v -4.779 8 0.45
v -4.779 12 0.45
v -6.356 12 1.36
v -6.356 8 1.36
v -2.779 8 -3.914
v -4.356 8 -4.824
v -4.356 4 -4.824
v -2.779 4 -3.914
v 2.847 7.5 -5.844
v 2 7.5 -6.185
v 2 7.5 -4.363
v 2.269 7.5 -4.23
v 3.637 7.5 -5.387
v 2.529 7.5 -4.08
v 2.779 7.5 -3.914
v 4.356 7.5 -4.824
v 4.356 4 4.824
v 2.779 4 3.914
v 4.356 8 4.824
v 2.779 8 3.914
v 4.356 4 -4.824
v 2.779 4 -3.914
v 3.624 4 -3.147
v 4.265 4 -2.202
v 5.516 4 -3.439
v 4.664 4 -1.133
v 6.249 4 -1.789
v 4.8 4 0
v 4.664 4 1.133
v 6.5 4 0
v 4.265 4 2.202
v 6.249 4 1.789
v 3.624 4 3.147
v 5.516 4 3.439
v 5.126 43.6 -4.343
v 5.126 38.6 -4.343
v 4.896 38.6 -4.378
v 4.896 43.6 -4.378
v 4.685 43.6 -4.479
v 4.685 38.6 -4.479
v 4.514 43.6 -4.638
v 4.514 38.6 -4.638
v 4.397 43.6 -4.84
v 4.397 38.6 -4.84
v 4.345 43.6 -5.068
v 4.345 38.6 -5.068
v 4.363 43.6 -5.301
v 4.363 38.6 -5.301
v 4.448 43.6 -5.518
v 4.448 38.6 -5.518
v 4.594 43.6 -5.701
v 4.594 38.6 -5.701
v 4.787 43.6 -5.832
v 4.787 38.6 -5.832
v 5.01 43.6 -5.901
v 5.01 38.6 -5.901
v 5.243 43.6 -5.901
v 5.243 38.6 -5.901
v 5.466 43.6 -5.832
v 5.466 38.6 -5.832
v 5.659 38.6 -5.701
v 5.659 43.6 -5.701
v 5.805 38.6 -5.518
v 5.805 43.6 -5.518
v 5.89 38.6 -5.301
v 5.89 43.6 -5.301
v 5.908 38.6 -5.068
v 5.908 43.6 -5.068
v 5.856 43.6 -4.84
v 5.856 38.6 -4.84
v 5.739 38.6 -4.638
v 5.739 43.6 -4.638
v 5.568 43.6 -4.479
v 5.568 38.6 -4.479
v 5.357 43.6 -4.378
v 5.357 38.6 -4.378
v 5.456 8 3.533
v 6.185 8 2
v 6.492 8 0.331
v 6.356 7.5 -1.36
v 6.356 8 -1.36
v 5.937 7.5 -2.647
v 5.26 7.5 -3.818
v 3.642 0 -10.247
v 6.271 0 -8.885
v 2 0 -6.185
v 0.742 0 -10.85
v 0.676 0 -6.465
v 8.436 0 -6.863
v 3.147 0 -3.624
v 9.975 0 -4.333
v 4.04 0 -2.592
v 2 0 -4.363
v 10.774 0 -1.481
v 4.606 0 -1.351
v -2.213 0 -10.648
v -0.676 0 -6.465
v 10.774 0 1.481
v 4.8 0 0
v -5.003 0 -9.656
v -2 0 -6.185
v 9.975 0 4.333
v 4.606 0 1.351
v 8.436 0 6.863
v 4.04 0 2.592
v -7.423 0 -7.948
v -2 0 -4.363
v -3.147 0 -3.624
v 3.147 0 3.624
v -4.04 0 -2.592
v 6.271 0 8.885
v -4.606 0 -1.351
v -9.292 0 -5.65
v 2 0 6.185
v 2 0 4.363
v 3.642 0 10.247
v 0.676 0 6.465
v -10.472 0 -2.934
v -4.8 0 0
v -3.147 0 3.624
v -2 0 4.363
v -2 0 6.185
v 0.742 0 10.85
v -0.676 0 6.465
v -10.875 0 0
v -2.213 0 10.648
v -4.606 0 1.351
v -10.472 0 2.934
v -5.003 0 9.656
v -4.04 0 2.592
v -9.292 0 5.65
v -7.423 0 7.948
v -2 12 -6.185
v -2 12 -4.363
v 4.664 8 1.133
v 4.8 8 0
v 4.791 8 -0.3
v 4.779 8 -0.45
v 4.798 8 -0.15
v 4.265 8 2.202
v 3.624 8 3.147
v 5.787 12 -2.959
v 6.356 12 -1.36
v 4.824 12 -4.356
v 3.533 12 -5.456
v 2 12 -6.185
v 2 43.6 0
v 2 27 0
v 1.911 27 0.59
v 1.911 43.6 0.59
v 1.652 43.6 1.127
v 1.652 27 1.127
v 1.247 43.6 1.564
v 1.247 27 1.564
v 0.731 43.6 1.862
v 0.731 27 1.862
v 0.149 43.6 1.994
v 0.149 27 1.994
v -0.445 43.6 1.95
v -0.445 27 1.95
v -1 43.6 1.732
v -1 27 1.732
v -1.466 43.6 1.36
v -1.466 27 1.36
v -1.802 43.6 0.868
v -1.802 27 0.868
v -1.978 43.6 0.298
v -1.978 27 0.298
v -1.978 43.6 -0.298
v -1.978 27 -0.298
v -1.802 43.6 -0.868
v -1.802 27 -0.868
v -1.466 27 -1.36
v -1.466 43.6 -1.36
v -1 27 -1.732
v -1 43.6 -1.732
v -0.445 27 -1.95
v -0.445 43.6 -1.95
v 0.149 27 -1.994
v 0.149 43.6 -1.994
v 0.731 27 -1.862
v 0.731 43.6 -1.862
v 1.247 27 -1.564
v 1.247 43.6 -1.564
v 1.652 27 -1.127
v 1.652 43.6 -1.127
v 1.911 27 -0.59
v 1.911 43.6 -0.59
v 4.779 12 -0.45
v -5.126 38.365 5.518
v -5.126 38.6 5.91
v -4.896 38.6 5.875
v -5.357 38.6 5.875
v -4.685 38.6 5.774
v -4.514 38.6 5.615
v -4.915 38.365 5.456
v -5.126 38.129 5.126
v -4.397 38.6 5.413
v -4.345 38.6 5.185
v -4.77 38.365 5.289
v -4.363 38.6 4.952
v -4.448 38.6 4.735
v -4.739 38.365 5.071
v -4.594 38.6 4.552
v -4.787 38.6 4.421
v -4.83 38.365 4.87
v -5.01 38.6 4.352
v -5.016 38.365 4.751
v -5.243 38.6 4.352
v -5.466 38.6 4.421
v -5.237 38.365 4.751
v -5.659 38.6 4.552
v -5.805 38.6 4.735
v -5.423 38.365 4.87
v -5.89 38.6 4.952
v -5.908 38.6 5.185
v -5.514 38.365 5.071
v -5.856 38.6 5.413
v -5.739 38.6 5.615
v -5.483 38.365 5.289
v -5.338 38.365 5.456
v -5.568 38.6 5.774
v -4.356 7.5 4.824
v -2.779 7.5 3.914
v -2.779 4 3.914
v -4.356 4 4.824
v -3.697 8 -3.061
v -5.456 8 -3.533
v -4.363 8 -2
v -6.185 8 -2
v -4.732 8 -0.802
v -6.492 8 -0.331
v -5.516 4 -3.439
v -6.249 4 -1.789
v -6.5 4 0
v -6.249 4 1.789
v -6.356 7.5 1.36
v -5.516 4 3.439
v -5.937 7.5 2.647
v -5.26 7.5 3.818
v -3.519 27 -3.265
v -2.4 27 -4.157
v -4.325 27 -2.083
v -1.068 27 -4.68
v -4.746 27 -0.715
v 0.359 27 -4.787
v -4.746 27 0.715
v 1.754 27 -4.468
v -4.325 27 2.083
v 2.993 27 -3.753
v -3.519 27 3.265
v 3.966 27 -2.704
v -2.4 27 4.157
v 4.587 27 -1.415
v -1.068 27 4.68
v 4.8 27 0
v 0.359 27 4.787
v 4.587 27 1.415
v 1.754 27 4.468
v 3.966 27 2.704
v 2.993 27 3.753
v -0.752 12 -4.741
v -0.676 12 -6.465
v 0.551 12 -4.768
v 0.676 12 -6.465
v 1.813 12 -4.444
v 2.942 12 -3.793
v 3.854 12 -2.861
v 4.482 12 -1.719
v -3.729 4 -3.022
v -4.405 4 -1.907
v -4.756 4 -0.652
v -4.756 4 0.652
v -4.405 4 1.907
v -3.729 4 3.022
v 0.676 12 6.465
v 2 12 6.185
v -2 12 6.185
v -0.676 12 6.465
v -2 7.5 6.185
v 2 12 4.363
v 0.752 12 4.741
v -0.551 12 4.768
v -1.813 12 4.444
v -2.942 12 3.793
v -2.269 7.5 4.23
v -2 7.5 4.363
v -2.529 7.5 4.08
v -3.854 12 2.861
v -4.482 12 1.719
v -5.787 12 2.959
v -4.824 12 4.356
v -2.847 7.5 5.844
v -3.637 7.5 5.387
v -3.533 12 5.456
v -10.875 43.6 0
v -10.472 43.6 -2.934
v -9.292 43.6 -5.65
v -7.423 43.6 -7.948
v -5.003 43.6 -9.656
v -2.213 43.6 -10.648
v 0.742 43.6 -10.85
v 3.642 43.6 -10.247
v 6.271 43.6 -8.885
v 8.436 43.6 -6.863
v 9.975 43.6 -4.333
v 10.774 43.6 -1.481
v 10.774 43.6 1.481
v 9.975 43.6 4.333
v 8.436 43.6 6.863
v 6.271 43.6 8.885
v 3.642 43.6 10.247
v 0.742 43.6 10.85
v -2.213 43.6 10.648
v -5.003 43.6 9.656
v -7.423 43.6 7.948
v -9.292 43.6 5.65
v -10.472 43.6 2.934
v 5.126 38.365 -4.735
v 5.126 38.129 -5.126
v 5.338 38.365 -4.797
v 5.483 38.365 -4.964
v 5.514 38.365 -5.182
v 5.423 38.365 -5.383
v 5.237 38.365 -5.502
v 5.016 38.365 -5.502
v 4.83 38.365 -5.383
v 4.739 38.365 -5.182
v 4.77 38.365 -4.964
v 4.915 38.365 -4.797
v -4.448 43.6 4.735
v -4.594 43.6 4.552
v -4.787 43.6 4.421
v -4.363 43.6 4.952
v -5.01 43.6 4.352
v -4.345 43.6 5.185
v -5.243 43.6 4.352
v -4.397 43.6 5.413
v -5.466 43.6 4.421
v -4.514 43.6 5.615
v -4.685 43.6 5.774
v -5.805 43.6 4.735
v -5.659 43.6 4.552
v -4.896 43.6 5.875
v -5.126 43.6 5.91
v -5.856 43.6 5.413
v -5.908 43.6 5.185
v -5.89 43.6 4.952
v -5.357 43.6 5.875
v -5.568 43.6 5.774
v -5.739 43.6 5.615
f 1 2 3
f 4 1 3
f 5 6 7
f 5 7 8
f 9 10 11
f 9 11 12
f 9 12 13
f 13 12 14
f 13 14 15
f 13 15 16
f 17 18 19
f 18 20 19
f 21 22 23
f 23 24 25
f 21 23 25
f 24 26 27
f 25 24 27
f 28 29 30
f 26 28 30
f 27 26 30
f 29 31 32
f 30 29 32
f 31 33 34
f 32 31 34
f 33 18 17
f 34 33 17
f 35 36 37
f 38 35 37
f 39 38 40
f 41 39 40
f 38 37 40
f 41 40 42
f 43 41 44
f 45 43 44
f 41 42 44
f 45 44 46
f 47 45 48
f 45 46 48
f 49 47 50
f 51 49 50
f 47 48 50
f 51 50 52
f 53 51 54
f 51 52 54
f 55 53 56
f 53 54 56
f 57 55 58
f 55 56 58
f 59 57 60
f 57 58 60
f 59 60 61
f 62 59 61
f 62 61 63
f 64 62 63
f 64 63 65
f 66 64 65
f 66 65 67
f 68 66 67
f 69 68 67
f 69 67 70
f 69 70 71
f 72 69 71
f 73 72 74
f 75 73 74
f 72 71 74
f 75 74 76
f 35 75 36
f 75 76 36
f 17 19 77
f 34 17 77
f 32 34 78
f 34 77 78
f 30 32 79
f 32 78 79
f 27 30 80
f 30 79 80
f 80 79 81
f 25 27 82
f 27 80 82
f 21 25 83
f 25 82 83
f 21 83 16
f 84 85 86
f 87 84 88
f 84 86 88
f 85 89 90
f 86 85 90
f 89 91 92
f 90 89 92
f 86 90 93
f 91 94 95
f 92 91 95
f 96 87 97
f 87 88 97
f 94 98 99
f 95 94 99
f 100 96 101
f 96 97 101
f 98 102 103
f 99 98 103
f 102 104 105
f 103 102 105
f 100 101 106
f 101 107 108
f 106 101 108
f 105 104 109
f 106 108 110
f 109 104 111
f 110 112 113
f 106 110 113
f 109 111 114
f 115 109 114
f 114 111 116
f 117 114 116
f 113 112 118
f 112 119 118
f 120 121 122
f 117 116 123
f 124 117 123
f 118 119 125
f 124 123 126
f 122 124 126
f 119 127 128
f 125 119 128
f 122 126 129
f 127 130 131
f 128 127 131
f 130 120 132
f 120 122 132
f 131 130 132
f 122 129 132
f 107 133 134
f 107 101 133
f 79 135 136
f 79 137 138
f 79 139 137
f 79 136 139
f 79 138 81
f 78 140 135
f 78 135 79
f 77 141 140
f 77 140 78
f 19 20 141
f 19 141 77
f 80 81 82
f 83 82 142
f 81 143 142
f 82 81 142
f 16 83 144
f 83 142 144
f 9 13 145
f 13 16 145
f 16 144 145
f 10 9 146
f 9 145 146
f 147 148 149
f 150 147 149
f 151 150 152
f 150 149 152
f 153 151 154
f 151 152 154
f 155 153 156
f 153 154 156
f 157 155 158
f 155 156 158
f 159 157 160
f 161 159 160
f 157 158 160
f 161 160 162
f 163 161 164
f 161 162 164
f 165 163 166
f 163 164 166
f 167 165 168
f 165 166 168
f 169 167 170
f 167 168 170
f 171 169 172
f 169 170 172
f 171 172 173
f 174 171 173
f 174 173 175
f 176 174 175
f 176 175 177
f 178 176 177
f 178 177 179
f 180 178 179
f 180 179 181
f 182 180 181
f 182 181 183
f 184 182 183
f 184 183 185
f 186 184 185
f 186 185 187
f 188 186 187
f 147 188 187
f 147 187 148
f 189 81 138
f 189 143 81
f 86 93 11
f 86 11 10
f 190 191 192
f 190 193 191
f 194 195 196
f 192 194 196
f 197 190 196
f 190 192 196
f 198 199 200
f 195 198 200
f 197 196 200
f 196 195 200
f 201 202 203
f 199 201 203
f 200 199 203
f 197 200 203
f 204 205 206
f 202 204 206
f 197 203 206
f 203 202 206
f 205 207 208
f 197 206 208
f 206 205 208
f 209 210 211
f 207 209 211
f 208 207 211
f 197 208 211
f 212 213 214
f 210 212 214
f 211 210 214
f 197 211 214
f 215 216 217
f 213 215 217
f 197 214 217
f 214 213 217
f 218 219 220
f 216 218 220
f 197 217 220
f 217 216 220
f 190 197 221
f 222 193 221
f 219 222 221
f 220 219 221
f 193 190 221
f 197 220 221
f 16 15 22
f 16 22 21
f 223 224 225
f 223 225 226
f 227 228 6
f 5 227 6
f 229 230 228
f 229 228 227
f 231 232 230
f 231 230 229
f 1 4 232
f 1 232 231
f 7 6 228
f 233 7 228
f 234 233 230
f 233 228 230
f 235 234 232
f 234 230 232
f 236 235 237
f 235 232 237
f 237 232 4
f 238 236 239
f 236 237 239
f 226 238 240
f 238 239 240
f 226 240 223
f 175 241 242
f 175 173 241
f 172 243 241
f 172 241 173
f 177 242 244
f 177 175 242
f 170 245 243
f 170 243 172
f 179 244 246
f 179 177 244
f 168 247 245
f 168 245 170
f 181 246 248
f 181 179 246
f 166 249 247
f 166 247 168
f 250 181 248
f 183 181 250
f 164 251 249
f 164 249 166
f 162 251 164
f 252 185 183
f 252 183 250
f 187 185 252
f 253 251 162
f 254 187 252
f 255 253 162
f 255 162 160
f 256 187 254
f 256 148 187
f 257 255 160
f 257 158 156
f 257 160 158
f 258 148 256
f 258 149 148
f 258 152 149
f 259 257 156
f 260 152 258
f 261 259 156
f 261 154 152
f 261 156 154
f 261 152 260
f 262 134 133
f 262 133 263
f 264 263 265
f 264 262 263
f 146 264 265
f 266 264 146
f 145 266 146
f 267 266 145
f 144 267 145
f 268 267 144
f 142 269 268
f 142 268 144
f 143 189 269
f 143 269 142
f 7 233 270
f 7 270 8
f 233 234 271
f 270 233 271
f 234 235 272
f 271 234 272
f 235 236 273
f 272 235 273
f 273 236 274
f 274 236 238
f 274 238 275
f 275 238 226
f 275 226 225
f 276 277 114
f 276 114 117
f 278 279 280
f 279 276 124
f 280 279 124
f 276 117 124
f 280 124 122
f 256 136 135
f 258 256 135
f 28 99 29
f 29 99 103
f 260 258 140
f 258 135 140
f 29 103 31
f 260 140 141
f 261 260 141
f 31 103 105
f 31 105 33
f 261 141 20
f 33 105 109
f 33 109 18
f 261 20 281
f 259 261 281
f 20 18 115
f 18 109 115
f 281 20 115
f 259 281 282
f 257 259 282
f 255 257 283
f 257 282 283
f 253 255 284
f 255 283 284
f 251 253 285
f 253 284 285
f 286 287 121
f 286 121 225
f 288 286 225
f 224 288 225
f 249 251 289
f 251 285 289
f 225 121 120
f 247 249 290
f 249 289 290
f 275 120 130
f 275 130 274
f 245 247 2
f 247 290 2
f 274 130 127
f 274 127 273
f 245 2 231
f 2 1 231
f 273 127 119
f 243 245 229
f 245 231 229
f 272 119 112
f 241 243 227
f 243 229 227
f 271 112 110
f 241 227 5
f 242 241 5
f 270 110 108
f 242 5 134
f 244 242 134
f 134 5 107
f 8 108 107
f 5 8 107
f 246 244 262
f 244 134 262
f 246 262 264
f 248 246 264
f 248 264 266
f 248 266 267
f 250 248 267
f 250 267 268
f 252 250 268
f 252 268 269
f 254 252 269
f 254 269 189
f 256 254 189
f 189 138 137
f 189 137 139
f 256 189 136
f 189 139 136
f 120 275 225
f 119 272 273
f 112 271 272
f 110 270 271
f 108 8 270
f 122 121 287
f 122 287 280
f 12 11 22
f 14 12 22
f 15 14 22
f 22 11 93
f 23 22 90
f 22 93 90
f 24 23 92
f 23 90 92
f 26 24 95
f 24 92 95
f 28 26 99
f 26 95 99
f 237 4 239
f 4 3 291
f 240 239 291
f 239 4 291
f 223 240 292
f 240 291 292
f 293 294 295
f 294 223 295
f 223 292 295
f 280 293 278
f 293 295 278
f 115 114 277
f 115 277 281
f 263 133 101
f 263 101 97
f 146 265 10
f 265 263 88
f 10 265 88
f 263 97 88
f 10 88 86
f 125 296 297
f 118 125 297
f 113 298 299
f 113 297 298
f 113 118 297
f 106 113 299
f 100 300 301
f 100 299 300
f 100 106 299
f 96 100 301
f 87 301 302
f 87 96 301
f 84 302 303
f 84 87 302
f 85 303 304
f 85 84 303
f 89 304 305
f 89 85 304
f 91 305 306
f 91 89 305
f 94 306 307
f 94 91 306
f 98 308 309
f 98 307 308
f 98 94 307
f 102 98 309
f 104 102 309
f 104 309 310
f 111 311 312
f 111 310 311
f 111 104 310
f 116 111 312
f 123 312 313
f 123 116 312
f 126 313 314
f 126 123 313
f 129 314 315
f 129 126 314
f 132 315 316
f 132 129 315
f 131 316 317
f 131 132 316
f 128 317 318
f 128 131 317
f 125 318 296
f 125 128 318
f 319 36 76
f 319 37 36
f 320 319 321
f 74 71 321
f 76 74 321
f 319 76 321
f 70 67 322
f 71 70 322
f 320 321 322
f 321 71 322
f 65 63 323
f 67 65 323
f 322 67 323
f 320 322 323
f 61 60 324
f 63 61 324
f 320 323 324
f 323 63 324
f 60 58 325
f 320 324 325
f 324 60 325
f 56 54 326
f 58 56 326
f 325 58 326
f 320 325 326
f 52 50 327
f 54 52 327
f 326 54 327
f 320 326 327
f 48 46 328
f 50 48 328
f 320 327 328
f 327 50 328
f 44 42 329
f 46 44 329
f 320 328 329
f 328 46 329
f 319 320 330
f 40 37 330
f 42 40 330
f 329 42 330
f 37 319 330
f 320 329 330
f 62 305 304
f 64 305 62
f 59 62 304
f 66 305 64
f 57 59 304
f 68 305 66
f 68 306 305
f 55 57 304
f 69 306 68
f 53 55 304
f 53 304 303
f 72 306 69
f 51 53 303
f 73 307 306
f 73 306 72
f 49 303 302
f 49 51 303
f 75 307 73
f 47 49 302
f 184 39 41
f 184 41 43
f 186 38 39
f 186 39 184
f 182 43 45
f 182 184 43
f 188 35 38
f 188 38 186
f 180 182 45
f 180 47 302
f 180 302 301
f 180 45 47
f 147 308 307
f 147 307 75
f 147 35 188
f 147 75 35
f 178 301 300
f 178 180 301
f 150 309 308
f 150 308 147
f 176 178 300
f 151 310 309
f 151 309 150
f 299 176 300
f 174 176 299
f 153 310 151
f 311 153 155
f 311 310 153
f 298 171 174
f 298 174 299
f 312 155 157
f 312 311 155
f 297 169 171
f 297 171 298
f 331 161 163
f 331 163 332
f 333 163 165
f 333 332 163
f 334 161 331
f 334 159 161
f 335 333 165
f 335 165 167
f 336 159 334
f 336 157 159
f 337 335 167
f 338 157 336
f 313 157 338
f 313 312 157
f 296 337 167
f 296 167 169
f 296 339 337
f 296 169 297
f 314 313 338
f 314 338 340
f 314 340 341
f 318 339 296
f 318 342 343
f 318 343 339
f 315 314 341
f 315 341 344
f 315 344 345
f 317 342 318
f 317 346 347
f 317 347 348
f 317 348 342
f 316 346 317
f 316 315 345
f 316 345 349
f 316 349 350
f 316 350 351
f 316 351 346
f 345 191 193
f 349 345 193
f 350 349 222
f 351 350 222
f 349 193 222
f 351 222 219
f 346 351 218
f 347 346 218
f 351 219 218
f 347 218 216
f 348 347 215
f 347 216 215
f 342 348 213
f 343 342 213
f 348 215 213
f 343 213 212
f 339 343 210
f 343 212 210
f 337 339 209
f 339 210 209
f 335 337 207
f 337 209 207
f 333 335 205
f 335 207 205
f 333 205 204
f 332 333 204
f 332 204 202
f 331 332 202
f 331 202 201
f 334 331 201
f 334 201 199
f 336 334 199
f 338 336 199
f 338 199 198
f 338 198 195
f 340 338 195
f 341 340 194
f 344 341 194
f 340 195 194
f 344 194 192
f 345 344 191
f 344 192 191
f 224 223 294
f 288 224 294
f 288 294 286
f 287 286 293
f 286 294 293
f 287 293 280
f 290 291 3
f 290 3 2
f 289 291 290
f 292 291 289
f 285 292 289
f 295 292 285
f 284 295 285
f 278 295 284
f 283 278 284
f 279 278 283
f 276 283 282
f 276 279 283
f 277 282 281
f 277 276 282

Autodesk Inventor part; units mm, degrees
ref_plane "YZ Plane" through (0, 0, 0) normal (1, 0, 0) x (0, 1, 0)
ref_plane "XZ Plane" through (0, 0, 0) normal (0, 1, 0) x (-1, 0, 0)
sketch "Sketch1" plane through (0, 0, 0) normal (0, 1, 0) x (-1, 0, 0)
  circle A0 centre (0, 0) radius 10.875
  dimension "d0" = 21.75
extrude "Extrusion1" add sketch "Sketch1" along normal blind 43.6
sketch "Sketch2" plane through (0, 0, 0) normal (0, -1, 0) x (1, 0, 0)
  circle A0 centre (0, 0) radius 2
  dimension "d3" = 4
extrude "Extrusion2" cut sketch "Sketch2" against normal through all
sketch "Sketch3" plane through (0, 0, 0) normal (0, -1, 0) x (1, 0, 0)
  line L0 (-2, -6.1847) -> (-2, 6.1847)
  line L1 (2, 6.1847) -> (2, -6.1847)
  arc A0 (2, 6.1847) -> (-2, 6.1847) centre (0, 0) ccw
  arc A1 (-2, -6.1847) -> (2, -6.1847) centre (0, 0) ccw
  dimension "d26" = 6.5
  dimension "d27" = 4
  dimension "d28" = 2
extrude "Extrusion3" cut sketch "Sketch3" against normal blind 12
sketch "Sketch4" plane through (0, 12, 0) normal (0, -1, 0) x (1, 0, 0)
  line L0 (2, -7.1361) -> (-2, -7.1361) construction
  line L1 (-2, -7.1361) -> (-2, 7.9296) construction
  line L2 (-2, 7.9296) -> (2, 7.9296) construction
  line L3 (2, 7.9296) -> (2, -7.1361) construction
  line L4 (7.1801, -1.836) -> (5.1801, -5.3001) construction
  line L5 (5.1801, -5.3001) -> (-7.8673, 2.2328) construction
  line L6 (-7.8673, 2.2328) -> (-5.8673, 5.6969) construction
  line L7 (-5.8673, 5.6969) -> (7.1801, -1.836) construction
  arc A0 (-2, 6.1847) -> (-6.3561, 1.3603) centre (0, 0) ccw
  arc A1 (2, -6.1847) -> (6.3561, -1.3603) centre (0, 0) ccw
  line L8 (-2, 6.1847) -> (-2, 3.4641)
  line L9 (6.3561, -1.3603) -> (-2, 3.4641)
  line L10 (2, -6.1847) -> (2, -3.4641)
  line L11 (2, -3.4641) -> (-6.3561, 1.3603)
  dimension "d29" = 4
  dimension "d32" = 60
extrude "Extrusion4" cut sketch "Sketch4" along normal blind 4.5
ref_plane "Work Plane1" through (0, 8, 0) normal (0, -1, 0) x (1, 0, 0)
sketch "Sketch5" plane through (0, 8, 0) normal (0, -1, 0) x (1, 0, 0)
  line L0 (2, -9.381) -> (-2, -9.381) construction
  line L1 (-2, -9.381) -> (-2, 10.3615) construction
  line L2 (-2, 10.3615) -> (2, 10.3615) construction
  line L3 (2, 10.3615) -> (2, -9.381) construction
  line L4 (9.1242, -2.9584) -> (7.1242, -6.4225) construction
  line L5 (7.1242, -6.4225) -> (-9.9734, 3.4487) construction
  line L6 (-9.9734, 3.4487) -> (-7.9734, 6.9128) construction
  line L7 (-7.9734, 6.9128) -> (9.1242, -2.9584) construction
  line L8 (7.1242, 6.4225) -> (9.1242, 2.9584) construction
  line L9 (9.1242, 2.9584) -> (-7.9734, -6.9128) construction
  line L10 (-7.9734, -6.9128) -> (-9.9734, -3.4487) construction
  line L11 (-9.9734, -3.4487) -> (7.1242, 6.4225) construction
  line L12 (2, -3.4641) -> (4.3561, -4.8244)
  line L13 (2, 6.1847) -> (2, 1.1547) projected
  line L14 (0, 2.3094) -> (2, 1.1547)
  line L15 (2, 1.1547) -> (2, -3.4641)
  line L16 (-2, 3.4641) -> (-4.3561, 4.8244)
  line L17 (-2, -6.1847) -> (-2, -1.1547) projected
  line L18 (-2, 3.4641) -> (-2, -1.1547)
  line L19 (-2, -1.1547) -> (0, -2.3094)
  line L20 (-4.3561, -4.8244) -> (0, -2.3094)
  arc A0 (-4.3561, 4.8244) -> (-4.3561, -4.8244) centre (0, 0) ccw
  arc A1 (4.3561, -4.8244) -> (4.3561, 4.8244) centre (0, 0) ccw
  line L21 (0, 2.3094) -> (4.3561, 4.8244)
  dimension "d37" = 4
  dimension "d40" = 60
  dimension "d44" = 60
extrude "Extrusion5" cut sketch "Sketch5" along normal blind 4
sketch "Sketch6" plane through (0, 0, 0) normal (0, -1, 0) x (1, 0, 0)
  circle A0 centre (0, 0) radius 4.8
  dimension "d49" = 9.6
extrude "Extrusion6" cut sketch "Sketch6" against normal blind 27
sketch "Sketch7" plane through (0, 43.6, 0) normal (0, 1, 0) x (1, 0, 0)
  line L0 (0, 0) -> (8.3053, 8.3053) construction
  line L1 (0, 0) -> (11.7454, 0) construction
  point P0 (5.1265, 5.1265)
  point P1 (-5.1265, -5.1265)
  dimension "d68" = 45
  dimension "d69" = 14.5
  dimension "d70" = 7.25
hole "Hole1" at (-5.1265, 43.6, 5.1265) at (5.1265, 43.6, -5.1265) direction (0, -1, 0) diameter 1.567 depth 5 tip angle 118 thread size "M2x0.4" class "6H" standard "ANSI Metric M Profile"
equation "\"d70\" = 0.5 * d69"
properties part number "EncoderHandleSupport"
